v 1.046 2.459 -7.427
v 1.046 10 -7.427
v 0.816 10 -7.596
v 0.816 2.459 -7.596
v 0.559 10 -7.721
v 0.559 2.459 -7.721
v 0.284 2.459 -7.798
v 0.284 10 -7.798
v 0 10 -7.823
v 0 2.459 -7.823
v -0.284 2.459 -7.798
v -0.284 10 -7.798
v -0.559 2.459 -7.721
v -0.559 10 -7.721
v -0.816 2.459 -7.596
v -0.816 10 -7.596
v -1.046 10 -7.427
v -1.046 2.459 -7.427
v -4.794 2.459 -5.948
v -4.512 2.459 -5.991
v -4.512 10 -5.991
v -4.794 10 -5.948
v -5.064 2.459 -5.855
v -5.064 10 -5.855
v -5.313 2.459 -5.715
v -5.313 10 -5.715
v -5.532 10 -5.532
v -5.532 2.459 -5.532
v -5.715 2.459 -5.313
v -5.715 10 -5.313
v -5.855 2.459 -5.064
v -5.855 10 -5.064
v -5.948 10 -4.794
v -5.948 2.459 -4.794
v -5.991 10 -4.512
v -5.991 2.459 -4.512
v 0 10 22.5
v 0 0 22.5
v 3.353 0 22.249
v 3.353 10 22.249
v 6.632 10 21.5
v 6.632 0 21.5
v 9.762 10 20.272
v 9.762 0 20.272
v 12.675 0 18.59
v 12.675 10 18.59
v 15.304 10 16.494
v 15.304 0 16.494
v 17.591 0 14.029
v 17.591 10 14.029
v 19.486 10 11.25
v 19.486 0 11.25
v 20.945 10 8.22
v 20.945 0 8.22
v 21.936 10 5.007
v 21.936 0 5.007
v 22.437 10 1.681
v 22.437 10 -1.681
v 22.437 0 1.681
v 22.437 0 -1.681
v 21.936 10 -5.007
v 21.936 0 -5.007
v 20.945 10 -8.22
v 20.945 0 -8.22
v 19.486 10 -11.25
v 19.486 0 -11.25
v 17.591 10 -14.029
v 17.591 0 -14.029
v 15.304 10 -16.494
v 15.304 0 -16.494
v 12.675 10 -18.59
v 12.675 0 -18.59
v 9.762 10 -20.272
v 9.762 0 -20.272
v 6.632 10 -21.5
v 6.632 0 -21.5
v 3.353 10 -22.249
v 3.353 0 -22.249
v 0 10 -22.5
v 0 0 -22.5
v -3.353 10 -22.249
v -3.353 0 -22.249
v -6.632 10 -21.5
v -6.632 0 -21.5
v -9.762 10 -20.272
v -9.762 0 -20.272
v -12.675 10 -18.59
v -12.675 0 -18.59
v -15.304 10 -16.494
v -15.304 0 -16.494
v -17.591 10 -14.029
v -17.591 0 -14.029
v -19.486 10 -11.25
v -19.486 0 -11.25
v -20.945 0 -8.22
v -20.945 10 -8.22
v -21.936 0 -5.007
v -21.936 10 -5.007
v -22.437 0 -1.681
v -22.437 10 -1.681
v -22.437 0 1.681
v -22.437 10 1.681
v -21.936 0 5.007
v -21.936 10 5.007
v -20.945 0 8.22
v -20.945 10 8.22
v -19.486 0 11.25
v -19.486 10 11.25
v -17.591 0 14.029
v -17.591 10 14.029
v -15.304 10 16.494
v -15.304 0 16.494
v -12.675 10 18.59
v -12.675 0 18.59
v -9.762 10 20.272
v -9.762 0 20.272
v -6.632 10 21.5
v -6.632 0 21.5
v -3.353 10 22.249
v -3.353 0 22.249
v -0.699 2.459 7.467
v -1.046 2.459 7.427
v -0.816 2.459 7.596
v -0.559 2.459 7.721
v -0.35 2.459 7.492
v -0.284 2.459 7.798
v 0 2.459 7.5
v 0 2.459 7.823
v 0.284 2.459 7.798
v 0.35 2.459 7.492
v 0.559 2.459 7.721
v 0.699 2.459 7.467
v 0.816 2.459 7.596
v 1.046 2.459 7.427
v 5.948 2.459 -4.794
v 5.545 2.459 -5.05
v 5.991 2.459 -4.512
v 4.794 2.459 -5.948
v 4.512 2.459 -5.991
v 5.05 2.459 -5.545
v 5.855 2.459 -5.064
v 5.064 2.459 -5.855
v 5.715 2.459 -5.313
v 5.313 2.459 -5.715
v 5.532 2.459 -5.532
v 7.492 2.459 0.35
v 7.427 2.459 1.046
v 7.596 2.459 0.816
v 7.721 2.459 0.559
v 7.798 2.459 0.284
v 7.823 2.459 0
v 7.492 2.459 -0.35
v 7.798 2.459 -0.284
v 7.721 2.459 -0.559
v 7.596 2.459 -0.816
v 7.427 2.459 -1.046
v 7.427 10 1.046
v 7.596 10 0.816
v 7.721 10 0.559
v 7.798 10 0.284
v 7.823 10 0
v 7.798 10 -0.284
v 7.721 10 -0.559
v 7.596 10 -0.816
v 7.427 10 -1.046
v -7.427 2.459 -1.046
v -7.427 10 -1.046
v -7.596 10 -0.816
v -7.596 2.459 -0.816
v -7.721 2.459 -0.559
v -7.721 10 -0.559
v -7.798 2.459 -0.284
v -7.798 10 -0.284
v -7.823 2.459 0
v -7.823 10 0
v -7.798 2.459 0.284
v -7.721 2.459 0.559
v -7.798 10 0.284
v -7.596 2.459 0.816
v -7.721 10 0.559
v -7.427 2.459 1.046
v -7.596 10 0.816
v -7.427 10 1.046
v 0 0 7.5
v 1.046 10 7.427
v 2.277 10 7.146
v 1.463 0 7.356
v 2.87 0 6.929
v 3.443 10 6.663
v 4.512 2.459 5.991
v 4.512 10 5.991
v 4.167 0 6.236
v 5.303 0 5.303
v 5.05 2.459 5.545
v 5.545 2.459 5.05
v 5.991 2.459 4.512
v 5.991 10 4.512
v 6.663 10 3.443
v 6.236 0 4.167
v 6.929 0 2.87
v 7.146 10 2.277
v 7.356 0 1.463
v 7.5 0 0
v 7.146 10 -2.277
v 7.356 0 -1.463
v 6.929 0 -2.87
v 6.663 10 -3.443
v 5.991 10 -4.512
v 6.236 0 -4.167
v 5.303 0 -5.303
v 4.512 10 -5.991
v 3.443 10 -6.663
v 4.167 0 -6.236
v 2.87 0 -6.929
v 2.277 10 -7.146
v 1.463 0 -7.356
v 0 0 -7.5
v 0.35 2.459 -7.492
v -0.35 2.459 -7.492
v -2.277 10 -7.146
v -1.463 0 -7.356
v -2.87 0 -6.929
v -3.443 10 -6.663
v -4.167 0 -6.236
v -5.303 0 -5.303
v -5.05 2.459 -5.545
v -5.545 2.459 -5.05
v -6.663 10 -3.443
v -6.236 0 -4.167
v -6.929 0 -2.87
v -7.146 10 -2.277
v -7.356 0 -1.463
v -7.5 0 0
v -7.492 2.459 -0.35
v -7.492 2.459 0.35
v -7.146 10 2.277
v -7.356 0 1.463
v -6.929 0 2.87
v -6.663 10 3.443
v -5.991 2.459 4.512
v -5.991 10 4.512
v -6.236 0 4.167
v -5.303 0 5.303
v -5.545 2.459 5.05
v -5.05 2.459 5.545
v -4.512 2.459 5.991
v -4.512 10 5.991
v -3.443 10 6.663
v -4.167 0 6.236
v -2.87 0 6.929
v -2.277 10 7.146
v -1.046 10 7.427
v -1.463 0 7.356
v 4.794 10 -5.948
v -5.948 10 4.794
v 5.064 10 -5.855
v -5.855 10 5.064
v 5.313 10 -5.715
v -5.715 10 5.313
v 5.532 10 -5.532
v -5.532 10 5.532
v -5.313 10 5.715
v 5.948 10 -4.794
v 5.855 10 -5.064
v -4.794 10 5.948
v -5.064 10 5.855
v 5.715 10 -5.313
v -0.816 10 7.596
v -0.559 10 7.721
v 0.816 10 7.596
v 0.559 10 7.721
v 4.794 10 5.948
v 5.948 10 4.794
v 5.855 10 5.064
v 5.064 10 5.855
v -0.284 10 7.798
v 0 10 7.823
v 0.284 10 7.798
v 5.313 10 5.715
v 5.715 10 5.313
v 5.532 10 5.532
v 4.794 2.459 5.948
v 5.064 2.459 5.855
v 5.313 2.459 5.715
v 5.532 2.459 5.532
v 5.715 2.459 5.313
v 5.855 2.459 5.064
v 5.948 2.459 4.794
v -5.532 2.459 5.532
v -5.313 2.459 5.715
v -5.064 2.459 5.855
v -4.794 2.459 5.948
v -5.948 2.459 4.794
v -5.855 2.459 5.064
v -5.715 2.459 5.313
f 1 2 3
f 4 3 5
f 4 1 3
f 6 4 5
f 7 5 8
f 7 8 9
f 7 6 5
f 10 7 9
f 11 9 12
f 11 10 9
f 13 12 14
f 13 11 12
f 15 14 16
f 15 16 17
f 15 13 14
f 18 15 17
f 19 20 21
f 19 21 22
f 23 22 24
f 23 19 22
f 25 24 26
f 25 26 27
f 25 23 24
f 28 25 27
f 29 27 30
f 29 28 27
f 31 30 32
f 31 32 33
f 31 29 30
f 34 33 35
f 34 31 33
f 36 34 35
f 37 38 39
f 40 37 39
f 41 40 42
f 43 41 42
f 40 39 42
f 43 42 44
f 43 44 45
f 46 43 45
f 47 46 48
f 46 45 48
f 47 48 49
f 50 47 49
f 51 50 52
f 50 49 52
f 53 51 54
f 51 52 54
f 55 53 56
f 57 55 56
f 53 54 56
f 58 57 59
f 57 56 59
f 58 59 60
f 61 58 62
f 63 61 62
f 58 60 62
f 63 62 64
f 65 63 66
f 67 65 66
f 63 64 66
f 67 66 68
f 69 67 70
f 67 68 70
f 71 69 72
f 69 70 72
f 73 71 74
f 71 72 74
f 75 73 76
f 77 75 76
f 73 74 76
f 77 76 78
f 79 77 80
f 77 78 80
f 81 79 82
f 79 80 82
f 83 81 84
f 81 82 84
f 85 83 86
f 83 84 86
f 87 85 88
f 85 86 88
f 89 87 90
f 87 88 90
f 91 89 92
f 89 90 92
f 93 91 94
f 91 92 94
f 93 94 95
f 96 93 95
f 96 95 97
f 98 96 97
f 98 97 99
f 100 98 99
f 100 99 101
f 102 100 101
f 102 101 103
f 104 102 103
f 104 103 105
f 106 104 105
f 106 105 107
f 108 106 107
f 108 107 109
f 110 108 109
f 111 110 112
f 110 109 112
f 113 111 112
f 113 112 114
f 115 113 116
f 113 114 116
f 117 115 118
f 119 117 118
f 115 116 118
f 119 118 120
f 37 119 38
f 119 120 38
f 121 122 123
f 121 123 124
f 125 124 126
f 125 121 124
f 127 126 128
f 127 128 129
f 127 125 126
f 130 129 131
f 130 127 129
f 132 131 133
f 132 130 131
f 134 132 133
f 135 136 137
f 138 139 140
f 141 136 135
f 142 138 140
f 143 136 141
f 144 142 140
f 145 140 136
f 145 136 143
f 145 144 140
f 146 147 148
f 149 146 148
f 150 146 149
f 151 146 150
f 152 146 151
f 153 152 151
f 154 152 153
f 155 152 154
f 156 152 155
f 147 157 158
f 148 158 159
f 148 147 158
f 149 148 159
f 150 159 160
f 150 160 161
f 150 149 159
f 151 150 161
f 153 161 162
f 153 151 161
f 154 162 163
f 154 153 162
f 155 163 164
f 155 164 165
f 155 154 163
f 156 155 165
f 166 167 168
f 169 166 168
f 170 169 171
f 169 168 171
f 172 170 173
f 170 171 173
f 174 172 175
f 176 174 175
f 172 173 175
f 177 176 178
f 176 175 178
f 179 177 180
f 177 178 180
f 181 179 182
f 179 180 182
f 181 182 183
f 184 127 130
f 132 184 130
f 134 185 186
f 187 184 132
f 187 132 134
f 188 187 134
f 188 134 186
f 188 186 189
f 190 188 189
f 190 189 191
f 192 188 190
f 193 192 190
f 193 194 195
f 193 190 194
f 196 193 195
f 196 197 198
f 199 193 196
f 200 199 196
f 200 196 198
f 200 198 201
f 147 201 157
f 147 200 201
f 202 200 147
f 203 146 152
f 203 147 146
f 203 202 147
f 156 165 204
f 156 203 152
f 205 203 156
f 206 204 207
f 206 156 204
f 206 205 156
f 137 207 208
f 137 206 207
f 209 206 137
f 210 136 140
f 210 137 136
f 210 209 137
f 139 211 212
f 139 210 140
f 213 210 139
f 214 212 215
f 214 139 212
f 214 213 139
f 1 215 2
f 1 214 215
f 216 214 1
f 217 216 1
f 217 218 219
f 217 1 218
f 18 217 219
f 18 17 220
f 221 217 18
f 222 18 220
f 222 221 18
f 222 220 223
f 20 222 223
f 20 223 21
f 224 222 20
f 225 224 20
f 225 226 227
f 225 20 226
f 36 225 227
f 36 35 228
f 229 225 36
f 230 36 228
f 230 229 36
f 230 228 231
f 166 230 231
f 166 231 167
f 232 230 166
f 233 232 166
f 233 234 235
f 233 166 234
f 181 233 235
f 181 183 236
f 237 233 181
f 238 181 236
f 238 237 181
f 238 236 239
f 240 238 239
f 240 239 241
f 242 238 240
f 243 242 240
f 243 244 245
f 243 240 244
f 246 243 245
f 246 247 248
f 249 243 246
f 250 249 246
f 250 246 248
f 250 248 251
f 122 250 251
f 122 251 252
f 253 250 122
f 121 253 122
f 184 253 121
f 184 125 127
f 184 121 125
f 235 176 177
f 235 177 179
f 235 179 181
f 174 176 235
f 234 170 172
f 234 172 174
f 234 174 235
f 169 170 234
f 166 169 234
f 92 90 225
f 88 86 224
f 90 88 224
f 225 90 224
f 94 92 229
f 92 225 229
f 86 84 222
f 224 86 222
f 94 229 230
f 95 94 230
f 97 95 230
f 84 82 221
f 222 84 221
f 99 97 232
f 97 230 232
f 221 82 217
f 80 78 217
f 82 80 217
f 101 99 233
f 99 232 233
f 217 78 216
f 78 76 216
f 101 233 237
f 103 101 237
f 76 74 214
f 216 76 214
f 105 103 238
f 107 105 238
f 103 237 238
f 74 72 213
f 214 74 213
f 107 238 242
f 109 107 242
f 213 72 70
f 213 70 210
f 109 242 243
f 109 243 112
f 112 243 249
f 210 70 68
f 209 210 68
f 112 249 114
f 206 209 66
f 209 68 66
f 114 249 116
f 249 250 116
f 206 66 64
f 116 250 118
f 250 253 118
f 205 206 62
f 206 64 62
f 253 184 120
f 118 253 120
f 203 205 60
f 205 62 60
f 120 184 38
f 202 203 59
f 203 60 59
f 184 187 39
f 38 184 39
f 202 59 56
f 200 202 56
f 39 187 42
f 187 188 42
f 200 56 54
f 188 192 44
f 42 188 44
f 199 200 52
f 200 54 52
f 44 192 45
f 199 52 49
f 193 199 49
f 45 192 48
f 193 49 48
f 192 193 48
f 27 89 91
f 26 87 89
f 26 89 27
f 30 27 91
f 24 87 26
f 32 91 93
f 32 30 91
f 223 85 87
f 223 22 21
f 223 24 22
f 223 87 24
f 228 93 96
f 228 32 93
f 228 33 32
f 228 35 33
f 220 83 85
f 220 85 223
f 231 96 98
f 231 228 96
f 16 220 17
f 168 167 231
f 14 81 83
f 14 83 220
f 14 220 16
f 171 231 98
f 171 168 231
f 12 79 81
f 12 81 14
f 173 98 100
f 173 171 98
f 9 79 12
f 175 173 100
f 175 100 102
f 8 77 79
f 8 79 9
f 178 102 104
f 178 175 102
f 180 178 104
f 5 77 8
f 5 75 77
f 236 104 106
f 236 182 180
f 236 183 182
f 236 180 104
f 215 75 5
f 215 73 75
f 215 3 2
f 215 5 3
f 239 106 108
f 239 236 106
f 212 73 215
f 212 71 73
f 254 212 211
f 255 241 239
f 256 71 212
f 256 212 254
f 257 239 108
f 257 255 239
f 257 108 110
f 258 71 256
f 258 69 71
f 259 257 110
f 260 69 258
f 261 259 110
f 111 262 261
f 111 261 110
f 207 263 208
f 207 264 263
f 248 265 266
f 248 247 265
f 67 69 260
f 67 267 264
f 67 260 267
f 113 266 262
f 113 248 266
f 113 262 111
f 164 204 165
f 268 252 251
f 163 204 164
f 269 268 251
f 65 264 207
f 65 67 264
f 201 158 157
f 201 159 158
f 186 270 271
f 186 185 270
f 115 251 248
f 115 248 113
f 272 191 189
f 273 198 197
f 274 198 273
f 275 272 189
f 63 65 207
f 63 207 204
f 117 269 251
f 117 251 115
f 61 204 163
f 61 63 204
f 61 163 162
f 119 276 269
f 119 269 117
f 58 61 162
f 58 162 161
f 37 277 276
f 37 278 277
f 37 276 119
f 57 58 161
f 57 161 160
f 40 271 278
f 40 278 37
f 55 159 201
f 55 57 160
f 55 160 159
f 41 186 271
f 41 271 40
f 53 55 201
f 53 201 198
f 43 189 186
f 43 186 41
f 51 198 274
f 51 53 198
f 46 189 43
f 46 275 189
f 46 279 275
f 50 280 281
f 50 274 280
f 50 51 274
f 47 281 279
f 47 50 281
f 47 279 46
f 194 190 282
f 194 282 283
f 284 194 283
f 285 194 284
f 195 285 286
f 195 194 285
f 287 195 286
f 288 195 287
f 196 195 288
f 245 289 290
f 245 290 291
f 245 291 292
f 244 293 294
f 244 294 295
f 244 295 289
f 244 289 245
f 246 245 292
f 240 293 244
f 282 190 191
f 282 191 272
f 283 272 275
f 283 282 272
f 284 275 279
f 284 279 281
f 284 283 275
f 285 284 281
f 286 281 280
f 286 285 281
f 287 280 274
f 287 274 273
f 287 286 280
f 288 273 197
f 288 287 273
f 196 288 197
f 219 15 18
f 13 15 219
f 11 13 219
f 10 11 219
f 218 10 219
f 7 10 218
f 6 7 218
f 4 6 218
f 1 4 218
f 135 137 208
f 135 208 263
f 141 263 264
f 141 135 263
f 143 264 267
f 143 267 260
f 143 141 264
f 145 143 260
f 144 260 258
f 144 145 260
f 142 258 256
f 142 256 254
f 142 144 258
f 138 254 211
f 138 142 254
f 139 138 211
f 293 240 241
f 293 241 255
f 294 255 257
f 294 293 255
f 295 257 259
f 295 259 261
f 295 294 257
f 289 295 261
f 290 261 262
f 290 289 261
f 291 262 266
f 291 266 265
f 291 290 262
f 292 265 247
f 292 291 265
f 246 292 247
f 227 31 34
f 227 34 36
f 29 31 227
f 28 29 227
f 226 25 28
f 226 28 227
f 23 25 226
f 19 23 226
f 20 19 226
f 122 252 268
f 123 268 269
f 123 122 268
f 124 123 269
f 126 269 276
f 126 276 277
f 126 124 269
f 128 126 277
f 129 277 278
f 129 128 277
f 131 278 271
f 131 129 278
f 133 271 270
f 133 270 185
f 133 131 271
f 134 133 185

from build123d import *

# Parameters (mm, degrees)
SKETCH1_R           = 22.5
BOSS_EXTRUDE1_DEPTH = 10
SKETCH2_R           = 7.5
CUT_EXTRUDE1_DEPTH  = 34.35416016
SKETCH3_R           = 1.578036786
CUT_EXTRUDE2_DEPTH  = 7.540717935
CIRPATTERN1_COUNT   = 8


with BuildPart() as part:
    # Sketch1 → Boss-Extrude1 (new body)
    with BuildSketch(Plane(origin=(0, 0, 0), x_dir=(1, 0, 0), z_dir=(0, 1, 0))):
        Circle(SKETCH1_R)
    extrude(amount=BOSS_EXTRUDE1_DEPTH)

    # Sketch2 → Cut-Extrude1 (cut, through all)
    with BuildSketch(Plane(origin=(0, 0, 0), x_dir=(1, 0, 0), z_dir=(0, 1, 0))):
        Circle(SKETCH2_R)
    extrude(amount=CUT_EXTRUDE1_DEPTH, mode=Mode.SUBTRACT)

    # Sketch3 → Cut-Extrude2 (cut)
    with BuildSketch(Plane(origin=(0, 10, 0), x_dir=(1, 0, 0), z_dir=(0, 1, 0))):
        with Locations((-6.245323663, 0)):
            Circle(SKETCH3_R)
    cut_extrude2 = extrude(amount=-CUT_EXTRUDE2_DEPTH, mode=Mode.SUBTRACT)

    # CirPattern1: Cut-Extrude2 ×8 about axis
    cirpattern1_axis = Axis((0, 0, 0), (0, 1, 0))
    for i in range(1, CIRPATTERN1_COUNT):
        add(cut_extrude2.rotate(cirpattern1_axis, i * 360 / CIRPATTERN1_COUNT), mode=Mode.SUBTRACT)


solid = part.part
